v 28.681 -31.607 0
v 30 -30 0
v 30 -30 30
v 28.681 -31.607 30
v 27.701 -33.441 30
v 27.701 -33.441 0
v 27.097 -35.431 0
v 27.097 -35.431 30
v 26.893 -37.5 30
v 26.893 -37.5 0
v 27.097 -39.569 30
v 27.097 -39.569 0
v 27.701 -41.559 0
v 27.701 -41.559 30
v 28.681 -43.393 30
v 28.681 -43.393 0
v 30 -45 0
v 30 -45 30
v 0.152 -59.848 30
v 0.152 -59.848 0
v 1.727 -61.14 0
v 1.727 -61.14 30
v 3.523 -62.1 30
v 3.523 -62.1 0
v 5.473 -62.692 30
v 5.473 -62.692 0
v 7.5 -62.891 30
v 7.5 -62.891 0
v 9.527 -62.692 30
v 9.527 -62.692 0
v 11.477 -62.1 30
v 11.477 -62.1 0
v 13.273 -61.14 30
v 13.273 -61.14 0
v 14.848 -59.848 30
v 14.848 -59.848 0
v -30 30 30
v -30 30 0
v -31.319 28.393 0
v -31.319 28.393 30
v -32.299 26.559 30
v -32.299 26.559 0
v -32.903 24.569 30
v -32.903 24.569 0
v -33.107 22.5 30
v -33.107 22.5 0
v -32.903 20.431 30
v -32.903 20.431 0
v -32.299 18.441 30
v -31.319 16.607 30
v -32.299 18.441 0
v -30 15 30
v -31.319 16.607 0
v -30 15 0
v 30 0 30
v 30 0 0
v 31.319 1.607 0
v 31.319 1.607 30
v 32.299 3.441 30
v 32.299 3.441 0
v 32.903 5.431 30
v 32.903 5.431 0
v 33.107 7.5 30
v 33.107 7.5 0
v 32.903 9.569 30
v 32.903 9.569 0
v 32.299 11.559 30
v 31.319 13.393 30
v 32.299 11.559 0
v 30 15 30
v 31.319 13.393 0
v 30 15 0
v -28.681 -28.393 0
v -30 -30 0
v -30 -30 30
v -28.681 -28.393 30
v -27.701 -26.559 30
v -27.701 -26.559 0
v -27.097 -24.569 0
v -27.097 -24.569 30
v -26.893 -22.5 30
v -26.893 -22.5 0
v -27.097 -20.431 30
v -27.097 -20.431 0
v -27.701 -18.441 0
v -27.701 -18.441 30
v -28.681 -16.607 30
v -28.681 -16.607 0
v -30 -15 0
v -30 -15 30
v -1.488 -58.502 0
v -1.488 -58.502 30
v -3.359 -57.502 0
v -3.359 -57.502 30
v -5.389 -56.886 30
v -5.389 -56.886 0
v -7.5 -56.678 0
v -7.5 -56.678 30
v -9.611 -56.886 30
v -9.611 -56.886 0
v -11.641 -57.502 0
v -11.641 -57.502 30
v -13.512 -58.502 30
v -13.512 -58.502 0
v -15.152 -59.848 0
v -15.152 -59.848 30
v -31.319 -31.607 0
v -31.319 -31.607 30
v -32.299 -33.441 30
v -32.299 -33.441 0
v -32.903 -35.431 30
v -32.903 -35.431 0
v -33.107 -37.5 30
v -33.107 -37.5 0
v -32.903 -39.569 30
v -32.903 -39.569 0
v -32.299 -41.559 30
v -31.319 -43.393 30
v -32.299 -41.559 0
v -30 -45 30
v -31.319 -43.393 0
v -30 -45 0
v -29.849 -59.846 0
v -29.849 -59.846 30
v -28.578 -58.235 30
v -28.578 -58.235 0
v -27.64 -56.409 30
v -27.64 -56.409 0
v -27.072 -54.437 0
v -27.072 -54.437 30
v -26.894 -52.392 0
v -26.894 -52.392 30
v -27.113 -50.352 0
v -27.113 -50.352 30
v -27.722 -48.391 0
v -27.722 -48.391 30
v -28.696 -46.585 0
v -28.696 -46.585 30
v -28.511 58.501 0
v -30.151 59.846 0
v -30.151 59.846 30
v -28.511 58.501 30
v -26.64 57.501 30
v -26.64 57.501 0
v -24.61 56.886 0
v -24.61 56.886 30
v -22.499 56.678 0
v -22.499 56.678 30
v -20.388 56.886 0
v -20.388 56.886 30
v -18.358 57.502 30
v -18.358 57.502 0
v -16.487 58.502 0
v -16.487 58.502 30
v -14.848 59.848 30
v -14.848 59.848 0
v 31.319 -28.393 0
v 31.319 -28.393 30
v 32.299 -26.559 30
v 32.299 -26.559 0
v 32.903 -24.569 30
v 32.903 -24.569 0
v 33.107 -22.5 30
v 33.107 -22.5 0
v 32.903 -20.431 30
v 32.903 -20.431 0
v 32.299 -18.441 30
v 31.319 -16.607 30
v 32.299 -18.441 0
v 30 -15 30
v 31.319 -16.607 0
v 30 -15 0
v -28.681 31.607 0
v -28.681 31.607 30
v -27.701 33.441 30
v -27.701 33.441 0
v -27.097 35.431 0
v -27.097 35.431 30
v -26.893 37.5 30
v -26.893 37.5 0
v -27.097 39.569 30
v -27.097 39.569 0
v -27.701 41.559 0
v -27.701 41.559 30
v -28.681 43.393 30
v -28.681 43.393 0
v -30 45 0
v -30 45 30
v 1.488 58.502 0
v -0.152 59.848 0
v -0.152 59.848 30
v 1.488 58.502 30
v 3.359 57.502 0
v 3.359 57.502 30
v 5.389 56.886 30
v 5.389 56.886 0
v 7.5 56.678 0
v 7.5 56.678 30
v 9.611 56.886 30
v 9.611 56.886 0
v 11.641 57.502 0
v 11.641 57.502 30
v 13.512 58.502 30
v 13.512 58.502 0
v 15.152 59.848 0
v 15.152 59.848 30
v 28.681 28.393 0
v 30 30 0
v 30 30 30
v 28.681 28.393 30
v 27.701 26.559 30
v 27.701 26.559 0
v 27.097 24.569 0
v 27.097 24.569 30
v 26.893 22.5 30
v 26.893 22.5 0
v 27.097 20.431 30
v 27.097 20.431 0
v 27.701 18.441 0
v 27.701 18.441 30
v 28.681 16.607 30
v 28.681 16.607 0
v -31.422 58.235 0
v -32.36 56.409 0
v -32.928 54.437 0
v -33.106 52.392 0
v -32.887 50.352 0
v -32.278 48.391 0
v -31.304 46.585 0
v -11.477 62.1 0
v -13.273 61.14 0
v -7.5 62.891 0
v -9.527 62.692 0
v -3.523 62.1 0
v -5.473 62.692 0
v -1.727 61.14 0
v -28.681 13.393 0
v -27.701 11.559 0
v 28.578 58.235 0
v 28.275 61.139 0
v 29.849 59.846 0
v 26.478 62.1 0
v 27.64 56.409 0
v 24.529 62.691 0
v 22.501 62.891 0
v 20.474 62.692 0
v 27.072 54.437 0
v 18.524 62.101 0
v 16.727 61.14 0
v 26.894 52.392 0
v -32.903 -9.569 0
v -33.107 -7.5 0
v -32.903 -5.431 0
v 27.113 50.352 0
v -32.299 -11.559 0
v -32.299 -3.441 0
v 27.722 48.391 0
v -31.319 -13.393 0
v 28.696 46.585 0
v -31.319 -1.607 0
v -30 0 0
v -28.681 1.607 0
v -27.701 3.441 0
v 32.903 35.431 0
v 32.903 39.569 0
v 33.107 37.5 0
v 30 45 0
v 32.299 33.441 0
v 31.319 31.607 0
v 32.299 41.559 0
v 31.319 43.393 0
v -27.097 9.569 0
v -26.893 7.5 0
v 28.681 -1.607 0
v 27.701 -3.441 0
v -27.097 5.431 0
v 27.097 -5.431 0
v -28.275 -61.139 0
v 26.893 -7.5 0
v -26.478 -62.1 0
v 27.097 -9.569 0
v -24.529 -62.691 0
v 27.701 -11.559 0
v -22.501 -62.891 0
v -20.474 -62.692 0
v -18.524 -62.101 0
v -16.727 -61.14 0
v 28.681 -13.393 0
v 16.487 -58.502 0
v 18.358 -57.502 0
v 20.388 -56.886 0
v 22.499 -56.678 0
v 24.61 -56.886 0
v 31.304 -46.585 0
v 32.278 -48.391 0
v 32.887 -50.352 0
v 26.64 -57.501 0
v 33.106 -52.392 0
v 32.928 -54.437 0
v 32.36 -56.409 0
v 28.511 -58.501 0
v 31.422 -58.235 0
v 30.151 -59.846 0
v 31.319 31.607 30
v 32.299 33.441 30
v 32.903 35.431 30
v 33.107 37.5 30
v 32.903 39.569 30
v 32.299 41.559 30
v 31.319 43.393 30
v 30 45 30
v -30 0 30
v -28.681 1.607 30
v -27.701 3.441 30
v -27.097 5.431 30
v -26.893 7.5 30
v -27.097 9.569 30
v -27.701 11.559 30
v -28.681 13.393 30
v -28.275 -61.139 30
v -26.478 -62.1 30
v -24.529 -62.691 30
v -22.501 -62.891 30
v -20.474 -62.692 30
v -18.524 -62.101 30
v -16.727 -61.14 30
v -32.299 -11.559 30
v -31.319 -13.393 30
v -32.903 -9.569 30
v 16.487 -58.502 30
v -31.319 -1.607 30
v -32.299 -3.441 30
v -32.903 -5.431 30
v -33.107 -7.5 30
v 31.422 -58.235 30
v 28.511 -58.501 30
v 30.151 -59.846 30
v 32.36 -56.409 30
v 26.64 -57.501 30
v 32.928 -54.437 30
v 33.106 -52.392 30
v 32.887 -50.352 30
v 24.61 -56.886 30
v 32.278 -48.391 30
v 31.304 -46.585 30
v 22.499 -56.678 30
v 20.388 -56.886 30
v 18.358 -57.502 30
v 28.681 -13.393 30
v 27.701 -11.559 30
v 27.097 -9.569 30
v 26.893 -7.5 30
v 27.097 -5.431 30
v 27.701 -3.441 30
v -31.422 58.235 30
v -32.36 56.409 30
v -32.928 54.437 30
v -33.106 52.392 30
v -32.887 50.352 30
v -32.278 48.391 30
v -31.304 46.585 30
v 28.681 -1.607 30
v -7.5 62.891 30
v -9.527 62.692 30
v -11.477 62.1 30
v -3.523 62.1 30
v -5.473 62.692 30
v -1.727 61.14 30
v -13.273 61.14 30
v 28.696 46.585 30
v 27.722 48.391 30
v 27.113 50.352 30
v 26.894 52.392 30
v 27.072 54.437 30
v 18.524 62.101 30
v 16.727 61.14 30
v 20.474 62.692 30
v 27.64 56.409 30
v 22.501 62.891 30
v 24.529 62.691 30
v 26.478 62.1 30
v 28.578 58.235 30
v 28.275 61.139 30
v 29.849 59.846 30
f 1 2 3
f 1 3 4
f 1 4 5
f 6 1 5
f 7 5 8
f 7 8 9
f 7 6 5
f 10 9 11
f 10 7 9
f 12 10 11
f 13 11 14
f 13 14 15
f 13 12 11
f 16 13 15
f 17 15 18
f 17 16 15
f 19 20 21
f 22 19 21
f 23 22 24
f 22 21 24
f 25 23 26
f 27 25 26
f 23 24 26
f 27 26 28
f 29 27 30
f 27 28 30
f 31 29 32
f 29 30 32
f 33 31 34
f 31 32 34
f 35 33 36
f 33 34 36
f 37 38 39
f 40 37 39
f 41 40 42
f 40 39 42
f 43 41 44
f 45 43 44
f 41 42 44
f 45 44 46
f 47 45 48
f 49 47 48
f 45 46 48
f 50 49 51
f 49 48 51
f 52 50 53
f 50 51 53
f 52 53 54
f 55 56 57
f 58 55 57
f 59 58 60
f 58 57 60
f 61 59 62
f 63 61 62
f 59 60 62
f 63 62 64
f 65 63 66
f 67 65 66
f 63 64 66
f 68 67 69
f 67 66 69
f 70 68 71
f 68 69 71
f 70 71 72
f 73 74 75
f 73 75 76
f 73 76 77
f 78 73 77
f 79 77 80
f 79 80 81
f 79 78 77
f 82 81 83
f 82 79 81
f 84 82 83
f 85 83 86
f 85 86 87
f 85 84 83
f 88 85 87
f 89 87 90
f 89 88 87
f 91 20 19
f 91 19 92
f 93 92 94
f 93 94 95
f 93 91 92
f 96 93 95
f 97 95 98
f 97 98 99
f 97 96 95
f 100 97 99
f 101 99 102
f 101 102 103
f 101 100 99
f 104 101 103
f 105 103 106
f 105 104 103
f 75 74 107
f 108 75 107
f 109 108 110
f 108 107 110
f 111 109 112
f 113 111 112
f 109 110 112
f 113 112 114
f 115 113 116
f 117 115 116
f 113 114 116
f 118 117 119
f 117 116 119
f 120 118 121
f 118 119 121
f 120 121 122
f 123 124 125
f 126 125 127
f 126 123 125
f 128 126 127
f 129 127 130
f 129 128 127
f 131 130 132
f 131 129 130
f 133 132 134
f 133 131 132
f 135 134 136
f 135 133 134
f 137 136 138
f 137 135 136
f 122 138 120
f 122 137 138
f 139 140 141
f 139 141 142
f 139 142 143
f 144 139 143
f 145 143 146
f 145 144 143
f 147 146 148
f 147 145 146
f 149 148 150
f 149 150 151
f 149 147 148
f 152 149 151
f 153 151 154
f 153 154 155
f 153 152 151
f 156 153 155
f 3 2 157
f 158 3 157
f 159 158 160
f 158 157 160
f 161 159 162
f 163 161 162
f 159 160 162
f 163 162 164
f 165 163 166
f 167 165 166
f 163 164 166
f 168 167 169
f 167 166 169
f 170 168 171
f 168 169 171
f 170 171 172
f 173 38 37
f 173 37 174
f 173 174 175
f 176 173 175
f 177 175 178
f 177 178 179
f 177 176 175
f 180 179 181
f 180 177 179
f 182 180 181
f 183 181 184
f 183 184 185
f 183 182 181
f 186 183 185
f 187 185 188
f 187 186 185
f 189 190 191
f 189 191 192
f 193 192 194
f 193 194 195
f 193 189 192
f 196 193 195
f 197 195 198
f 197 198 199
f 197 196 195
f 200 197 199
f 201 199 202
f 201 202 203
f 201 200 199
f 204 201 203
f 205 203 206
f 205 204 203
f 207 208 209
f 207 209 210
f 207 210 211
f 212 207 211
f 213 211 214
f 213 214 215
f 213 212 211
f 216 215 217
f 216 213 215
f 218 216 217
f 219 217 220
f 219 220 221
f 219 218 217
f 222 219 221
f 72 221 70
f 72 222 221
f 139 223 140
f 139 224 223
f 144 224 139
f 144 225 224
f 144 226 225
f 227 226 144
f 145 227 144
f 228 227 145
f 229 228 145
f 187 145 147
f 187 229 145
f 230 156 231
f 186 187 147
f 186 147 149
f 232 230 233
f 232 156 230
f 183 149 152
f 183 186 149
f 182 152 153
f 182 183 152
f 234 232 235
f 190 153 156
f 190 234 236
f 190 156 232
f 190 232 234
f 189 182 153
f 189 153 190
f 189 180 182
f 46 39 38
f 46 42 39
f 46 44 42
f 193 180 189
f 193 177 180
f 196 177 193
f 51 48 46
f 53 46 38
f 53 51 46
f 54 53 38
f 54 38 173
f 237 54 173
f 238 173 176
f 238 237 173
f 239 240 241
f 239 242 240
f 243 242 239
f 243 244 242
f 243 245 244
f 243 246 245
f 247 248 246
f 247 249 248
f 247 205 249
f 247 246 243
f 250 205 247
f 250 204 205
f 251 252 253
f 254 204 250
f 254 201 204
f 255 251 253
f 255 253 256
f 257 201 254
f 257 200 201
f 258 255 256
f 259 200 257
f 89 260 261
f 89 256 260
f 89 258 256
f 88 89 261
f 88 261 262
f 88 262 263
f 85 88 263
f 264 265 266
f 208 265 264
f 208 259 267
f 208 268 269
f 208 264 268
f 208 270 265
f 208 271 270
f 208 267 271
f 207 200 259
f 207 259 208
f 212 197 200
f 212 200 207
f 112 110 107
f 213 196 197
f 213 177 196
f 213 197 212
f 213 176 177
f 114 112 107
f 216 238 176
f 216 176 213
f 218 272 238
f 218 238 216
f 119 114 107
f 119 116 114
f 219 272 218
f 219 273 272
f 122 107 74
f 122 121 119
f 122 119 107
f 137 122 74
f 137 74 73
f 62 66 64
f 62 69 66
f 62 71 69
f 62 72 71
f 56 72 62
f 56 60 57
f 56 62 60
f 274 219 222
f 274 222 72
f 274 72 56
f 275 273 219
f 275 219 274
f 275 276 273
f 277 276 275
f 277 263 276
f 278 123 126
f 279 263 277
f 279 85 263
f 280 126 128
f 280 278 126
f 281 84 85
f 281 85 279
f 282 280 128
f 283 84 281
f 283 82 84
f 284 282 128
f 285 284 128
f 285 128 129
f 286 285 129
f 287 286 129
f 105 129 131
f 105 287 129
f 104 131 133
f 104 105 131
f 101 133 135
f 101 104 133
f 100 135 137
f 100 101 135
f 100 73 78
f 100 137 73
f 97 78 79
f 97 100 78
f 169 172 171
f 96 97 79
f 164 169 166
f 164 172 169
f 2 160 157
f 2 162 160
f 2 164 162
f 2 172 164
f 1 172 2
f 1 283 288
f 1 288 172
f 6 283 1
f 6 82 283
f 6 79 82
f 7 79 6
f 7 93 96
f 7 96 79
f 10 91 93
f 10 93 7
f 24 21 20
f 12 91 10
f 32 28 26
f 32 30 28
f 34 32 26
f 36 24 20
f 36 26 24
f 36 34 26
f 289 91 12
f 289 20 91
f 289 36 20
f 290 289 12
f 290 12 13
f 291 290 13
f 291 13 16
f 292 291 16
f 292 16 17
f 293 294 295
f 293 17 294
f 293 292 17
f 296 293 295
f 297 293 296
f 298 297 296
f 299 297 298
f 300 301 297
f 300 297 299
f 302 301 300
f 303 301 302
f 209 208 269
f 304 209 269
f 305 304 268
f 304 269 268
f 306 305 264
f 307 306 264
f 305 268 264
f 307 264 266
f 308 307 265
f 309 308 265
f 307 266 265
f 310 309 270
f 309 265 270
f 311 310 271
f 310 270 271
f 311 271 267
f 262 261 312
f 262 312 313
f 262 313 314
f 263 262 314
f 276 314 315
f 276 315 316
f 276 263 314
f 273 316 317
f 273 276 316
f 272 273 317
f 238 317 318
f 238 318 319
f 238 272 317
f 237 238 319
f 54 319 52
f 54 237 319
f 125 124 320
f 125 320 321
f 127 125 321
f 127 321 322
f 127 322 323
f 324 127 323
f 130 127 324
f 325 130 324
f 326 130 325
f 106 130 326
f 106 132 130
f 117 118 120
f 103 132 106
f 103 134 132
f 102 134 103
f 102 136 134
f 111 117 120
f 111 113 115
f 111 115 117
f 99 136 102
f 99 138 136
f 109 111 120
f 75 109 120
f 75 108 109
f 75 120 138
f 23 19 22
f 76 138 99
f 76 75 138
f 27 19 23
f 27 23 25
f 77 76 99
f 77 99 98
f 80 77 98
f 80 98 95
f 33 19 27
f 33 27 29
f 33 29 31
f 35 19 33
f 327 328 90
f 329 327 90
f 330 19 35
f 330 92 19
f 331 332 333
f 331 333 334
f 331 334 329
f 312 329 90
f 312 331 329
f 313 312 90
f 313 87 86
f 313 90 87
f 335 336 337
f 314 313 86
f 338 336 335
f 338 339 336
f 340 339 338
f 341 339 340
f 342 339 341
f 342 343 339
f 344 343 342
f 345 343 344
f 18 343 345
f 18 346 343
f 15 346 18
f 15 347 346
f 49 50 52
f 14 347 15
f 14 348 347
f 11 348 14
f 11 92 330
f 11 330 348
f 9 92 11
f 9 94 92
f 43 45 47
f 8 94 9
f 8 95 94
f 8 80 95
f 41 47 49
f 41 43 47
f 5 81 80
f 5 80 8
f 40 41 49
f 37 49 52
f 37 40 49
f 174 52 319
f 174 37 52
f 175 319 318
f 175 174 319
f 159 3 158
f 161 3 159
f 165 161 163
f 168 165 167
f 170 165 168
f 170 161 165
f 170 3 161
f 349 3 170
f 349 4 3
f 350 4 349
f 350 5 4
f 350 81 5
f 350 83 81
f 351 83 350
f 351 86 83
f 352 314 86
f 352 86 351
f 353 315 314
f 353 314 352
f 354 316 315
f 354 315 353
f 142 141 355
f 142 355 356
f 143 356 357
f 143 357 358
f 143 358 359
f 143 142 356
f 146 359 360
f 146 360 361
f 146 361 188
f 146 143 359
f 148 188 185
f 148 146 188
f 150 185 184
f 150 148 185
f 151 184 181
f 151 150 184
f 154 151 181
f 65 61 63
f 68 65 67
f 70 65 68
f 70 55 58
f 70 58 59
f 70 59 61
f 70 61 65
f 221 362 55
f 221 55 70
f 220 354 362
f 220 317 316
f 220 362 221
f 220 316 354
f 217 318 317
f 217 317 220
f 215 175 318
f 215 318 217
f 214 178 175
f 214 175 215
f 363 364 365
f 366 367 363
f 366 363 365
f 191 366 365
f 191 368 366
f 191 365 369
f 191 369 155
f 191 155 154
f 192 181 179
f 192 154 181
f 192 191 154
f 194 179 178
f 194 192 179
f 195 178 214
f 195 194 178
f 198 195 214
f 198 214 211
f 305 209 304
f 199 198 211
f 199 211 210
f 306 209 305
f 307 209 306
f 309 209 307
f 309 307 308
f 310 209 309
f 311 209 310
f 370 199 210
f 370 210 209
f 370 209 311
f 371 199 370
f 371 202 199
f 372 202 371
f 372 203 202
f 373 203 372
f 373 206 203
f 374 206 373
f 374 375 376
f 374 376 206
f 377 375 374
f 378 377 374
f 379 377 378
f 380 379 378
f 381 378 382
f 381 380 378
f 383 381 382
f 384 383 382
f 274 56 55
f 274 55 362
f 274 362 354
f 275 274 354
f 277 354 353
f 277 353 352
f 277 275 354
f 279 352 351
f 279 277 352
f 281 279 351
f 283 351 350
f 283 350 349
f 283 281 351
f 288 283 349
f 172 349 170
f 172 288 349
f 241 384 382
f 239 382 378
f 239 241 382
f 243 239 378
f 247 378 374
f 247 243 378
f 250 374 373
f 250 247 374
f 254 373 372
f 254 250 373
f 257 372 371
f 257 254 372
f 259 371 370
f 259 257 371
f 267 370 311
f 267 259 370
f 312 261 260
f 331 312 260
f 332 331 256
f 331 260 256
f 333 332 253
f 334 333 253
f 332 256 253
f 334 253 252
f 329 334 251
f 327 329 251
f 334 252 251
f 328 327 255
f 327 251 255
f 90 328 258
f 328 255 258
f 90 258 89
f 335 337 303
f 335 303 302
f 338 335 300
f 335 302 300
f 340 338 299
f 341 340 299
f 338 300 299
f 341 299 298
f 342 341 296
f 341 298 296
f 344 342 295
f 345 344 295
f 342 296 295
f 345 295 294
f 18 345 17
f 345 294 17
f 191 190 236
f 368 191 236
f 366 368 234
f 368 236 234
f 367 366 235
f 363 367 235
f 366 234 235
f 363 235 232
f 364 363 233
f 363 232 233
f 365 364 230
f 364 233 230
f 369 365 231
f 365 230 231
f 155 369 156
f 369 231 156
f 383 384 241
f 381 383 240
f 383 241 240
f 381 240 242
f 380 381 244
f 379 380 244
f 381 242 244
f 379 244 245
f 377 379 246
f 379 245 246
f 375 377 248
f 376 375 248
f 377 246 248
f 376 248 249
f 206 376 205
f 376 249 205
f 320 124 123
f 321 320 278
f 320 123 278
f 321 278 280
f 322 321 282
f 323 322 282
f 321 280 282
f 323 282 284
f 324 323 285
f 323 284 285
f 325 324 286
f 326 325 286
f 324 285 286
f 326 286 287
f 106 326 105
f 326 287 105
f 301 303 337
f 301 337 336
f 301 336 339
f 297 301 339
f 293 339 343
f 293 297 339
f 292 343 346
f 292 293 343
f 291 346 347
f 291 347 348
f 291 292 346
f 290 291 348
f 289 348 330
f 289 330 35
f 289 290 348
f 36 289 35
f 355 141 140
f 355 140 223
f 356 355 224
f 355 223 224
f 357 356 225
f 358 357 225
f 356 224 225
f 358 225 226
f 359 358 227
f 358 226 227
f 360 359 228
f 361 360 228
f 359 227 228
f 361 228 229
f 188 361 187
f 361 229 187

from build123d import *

# Parameters (mm, degrees)
SKETCH016_W                             = 90
SKETCH016_H                             = 2.6
PAD005_DEPTH                            = 65
POCKET006_DEPTH                         = 316.271517
POCKET006_DEPTH_BACK                    = 318.871517
POCKET006_LINEARPATTERN003_2_DEPTH      = 316.271517
POCKET006_LINEARPATTERN003_2_DEPTH_BACK = 318.871517
LINEARPATTERN004_COUNT                  = 4
LINEARPATTERN004_PITCH                  = 30
SKETCH018_W                             = 120
SKETCH018_H                             = 175
POCKET007_DEPTH                         = 2.601
PAD006_DEPTH                            = 30


with BuildPart() as part:
    # Sketch016 → Pad005 (new body, symmetric)
    with BuildSketch(Plane.XZ):
        with Locations((0, 1.3)):
            Rectangle(SKETCH016_W, SKETCH016_H)
    extrude(amount=PAD005_DEPTH, both=True)

    # Sketch017 → Pocket006 (cut, two sides)
    with BuildSketch(Plane.XY) as pocket006_sk:
        with BuildLine():
            ThreePointArc((-30, 57.87868), (-22.5, 55.300828), (-15, 57.87868))
            ThreePointArc((-15, 47.12132), (-13.270688, 52.5), (-15, 57.87868))
            ThreePointArc((-15, 47.12132), (-22.5, 49.699172), (-30, 47.12132))
            ThreePointArc((-30, 57.87868), (-31.729312, 52.5), (-30, 47.12132))
        make_face()
        with BuildLine():
            ThreePointArc((-2.12132, 60), (-7.5, 61.729312), (-12.87868, 60))
            ThreePointArc((-12.87868, 45), (-10.300828, 52.5), (-12.87868, 60))
            ThreePointArc((-12.87868, 45), (-7.5, 43.270688), (-2.12132, 45))
            ThreePointArc((-2.12132, 60), (-4.699172, 52.5), (-2.12132, 45))
        make_face()
        with BuildLine():
            ThreePointArc((-17.12132, 45), (-22.5, 46.729312), (-27.87868, 45))
            ThreePointArc((-27.87868, 30), (-25.300828, 37.5), (-27.87868, 45))
            ThreePointArc((-27.87868, 30), (-22.5, 28.270688), (-17.12132, 30))
            ThreePointArc((-17.12132, 45), (-19.699172, 37.5), (-17.12132, 30))
        make_face()
        with BuildLine():
            ThreePointArc((-15, 42.87868), (-16.729312, 37.5), (-15, 32.12132))
            ThreePointArc((0, 32.12132), (-7.5, 34.699172), (-15, 32.12132))
            ThreePointArc((0, 32.12132), (1.729312, 37.5), (0, 42.87868))
            ThreePointArc((-15, 42.87868), (-7.5, 40.300828), (0, 42.87868))
        make_face()
    pocket006 = extrude(amount=-POCKET006_DEPTH, mode=Mode.SUBTRACT) + extrude(pocket006_sk.sketch, amount=POCKET006_DEPTH_BACK, mode=Mode.SUBTRACT)

    # Sketch017 LinearPattern003 2 → Pocket006 LinearPattern003 2 (cut, two sides)
    with BuildSketch(Plane(origin=(30, 0, 0), x_dir=(1, 0, 0), z_dir=(0, 0, 1))) as pocket006_linearpattern003_2_sk:
        with BuildLine():
            ThreePointArc((-30, 57.87868), (-22.5, 55.300828), (-15, 57.87868))
            ThreePointArc((-15, 47.12132), (-13.270688, 52.5), (-15, 57.87868))
            ThreePointArc((-15, 47.12132), (-22.5, 49.699172), (-30, 47.12132))
            ThreePointArc((-30, 57.87868), (-31.729312, 52.5), (-30, 47.12132))
        make_face()
        with BuildLine():
            ThreePointArc((-2.12132, 60), (-7.5, 61.729312), (-12.87868, 60))
            ThreePointArc((-12.87868, 45), (-10.300828, 52.5), (-12.87868, 60))
            ThreePointArc((-12.87868, 45), (-7.5, 43.270688), (-2.12132, 45))
            ThreePointArc((-2.12132, 60), (-4.699172, 52.5), (-2.12132, 45))
        make_face()
        with BuildLine():
            ThreePointArc((-17.12132, 45), (-22.5, 46.729312), (-27.87868, 45))
            ThreePointArc((-27.87868, 30), (-25.300828, 37.5), (-27.87868, 45))
            ThreePointArc((-27.87868, 30), (-22.5, 28.270688), (-17.12132, 30))
            ThreePointArc((-17.12132, 45), (-19.699172, 37.5), (-17.12132, 30))
        make_face()
        with BuildLine():
            ThreePointArc((-15, 42.87868), (-16.729312, 37.5), (-15, 32.12132))
            ThreePointArc((0, 32.12132), (-7.5, 34.699172), (-15, 32.12132))
            ThreePointArc((0, 32.12132), (1.729312, 37.5), (0, 42.87868))
            ThreePointArc((-15, 42.87868), (-7.5, 40.300828), (0, 42.87868))
        make_face()
    pocket006_linearpattern003_2 = extrude(amount=-POCKET006_LINEARPATTERN003_2_DEPTH, mode=Mode.SUBTRACT) + extrude(pocket006_linearpattern003_2_sk.sketch, amount=POCKET006_LINEARPATTERN003_2_DEPTH_BACK, mode=Mode.SUBTRACT)

    # LinearPattern004: Pocket006, Pocket006 LinearPattern003 2 ×4
    with Locations(*[(0, -i * LINEARPATTERN004_PITCH, 0) for i in range(1, LINEARPATTERN004_COUNT)]):
        add(pocket006, mode=Mode.SUBTRACT)
        add(pocket006_linearpattern003_2, mode=Mode.SUBTRACT)

    # Sketch018 → Pocket007 (cut, through all)
    with BuildSketch(Plane.XY):
        Rectangle(SKETCH018_W, SKETCH018_H)
        with BuildLine():
            ThreePointArc((-30.150681, 59.846229), (-33.106055, 52.392354), (-30, 45))
            ThreePointArc((-30, 30), (-26.893398, 37.5), (-30, 45))
            ThreePointArc((-30, 30), (-33.106602, 22.5), (-30, 15))
            ThreePointArc((-30, 0), (-26.893398, 7.5), (-30, 15))
            ThreePointArc((-30, 0), (-33.106602, -7.5), (-30, -15))
            ThreePointArc((-30, -30), (-26.893398, -22.5), (-30, -15))
            ThreePointArc((-30, -30), (-33.106602, -37.5), (-30, -45))
            ThreePointArc((-29.849318, -59.846228), (-26.893945, -52.392354), (-30, -45))
            ThreePointArc((-29.849318, -59.846228), (-22.501092, -62.891321), (-15.152226, -59.847774))
            ThreePointArc((0.152226, -59.847774), (-7.5, -56.678118), (-15.152226, -59.847774))
            ThreePointArc((0.152226, -59.847774), (7.5, -62.891321), (14.847774, -59.847774))
            ThreePointArc((30.150681, -59.846229), (22.498908, -56.678118), (14.847774, -59.847774))
            ThreePointArc((30.150681, -59.846229), (33.106055, -52.392354), (30, -45))
            ThreePointArc((30, -30), (26.893398, -37.5), (30, -45))
            ThreePointArc((30, -30), (33.106602, -22.5), (30, -15))
            ThreePointArc((30, 0), (26.893398, -7.5), (30, -15))
            ThreePointArc((30, 0), (33.106602, 7.5), (30, 15))
            ThreePointArc((30, 30), (26.893398, 22.5), (30, 15))
            ThreePointArc((30, 30), (33.106602, 37.5), (30, 45))
            ThreePointArc((29.849318, 59.846228), (26.893945, 52.392354), (30, 45))
            ThreePointArc((29.849318, 59.846228), (22.501092, 62.891321), (15.152226, 59.847774))
            ThreePointArc((-0.152226, 59.847774), (7.5, 56.678118), (15.152226, 59.847774))
            ThreePointArc((-0.152226, 59.847774), (-7.5, 62.891321), (-14.847774, 59.847774))
            ThreePointArc((-30.150681, 59.846229), (-22.498908, 56.678118), (-14.847774, 59.847774))
        make_face(mode=Mode.SUBTRACT)
    extrude(amount=POCKET007_DEPTH, mode=Mode.SUBTRACT)

    # Sketch019 → Pad006 (join)
    with BuildSketch(Plane.XY):
        with BuildLine():
            ThreePointArc((-30.150681, 59.846229), (-33.106055, 52.392354), (-30, 45))
            ThreePointArc((-30, 30), (-26.893398, 37.5), (-30, 45))
            ThreePointArc((-30, 30), (-33.106602, 22.5), (-30, 15))
            ThreePointArc((-30, 0), (-26.893398, 7.5), (-30, 15))
            ThreePointArc((-30, 0), (-33.106602, -7.5), (-30, -15))
            ThreePointArc((-30, -30), (-26.893398, -22.5), (-30, -15))
            ThreePointArc((-30, -30), (-33.106602, -37.5), (-30, -45))
            ThreePointArc((-29.849318, -59.846228), (-26.893945, -52.392354), (-30, -45))
            ThreePointArc((-29.849318, -59.846228), (-22.501092, -62.891321), (-15.152226, -59.847774))
            ThreePointArc((0.152226, -59.847774), (-7.5, -56.678118), (-15.152226, -59.847774))
            ThreePointArc((0.152226, -59.847774), (7.5, -62.891321), (14.847774, -59.847774))
            ThreePointArc((30.150681, -59.846229), (22.498908, -56.678118), (14.847774, -59.847774))
            ThreePointArc((30.150681, -59.846229), (33.106055, -52.392354), (30, -45))
            ThreePointArc((30, -30), (26.893398, -37.5), (30, -45))
            ThreePointArc((30, -30), (33.106602, -22.5), (30, -15))
            ThreePointArc((30, 0), (26.893398, -7.5), (30, -15))
            ThreePointArc((30, 0), (33.106602, 7.5), (30, 15))
            ThreePointArc((30, 30), (26.893398, 22.5), (30, 15))
            ThreePointArc((30, 30), (33.106602, 37.5), (30, 45))
            ThreePointArc((29.849318, 59.846228), (26.893945, 52.392354), (30, 45))
            ThreePointArc((29.849318, 59.846228), (22.501092, 62.891321), (15.152226, 59.847774))
            ThreePointArc((-0.152226, 59.847774), (7.5, 56.678118), (15.152226, 59.847774))
            ThreePointArc((-0.152226, 59.847774), (-7.5, 62.891321), (-14.847774, 59.847774))
            ThreePointArc((-30.150681, 59.846229), (-22.498908, 56.678118), (-14.847774, 59.847774))
        make_face()
    extrude(amount=PAD006_DEPTH)


solid = part.part
